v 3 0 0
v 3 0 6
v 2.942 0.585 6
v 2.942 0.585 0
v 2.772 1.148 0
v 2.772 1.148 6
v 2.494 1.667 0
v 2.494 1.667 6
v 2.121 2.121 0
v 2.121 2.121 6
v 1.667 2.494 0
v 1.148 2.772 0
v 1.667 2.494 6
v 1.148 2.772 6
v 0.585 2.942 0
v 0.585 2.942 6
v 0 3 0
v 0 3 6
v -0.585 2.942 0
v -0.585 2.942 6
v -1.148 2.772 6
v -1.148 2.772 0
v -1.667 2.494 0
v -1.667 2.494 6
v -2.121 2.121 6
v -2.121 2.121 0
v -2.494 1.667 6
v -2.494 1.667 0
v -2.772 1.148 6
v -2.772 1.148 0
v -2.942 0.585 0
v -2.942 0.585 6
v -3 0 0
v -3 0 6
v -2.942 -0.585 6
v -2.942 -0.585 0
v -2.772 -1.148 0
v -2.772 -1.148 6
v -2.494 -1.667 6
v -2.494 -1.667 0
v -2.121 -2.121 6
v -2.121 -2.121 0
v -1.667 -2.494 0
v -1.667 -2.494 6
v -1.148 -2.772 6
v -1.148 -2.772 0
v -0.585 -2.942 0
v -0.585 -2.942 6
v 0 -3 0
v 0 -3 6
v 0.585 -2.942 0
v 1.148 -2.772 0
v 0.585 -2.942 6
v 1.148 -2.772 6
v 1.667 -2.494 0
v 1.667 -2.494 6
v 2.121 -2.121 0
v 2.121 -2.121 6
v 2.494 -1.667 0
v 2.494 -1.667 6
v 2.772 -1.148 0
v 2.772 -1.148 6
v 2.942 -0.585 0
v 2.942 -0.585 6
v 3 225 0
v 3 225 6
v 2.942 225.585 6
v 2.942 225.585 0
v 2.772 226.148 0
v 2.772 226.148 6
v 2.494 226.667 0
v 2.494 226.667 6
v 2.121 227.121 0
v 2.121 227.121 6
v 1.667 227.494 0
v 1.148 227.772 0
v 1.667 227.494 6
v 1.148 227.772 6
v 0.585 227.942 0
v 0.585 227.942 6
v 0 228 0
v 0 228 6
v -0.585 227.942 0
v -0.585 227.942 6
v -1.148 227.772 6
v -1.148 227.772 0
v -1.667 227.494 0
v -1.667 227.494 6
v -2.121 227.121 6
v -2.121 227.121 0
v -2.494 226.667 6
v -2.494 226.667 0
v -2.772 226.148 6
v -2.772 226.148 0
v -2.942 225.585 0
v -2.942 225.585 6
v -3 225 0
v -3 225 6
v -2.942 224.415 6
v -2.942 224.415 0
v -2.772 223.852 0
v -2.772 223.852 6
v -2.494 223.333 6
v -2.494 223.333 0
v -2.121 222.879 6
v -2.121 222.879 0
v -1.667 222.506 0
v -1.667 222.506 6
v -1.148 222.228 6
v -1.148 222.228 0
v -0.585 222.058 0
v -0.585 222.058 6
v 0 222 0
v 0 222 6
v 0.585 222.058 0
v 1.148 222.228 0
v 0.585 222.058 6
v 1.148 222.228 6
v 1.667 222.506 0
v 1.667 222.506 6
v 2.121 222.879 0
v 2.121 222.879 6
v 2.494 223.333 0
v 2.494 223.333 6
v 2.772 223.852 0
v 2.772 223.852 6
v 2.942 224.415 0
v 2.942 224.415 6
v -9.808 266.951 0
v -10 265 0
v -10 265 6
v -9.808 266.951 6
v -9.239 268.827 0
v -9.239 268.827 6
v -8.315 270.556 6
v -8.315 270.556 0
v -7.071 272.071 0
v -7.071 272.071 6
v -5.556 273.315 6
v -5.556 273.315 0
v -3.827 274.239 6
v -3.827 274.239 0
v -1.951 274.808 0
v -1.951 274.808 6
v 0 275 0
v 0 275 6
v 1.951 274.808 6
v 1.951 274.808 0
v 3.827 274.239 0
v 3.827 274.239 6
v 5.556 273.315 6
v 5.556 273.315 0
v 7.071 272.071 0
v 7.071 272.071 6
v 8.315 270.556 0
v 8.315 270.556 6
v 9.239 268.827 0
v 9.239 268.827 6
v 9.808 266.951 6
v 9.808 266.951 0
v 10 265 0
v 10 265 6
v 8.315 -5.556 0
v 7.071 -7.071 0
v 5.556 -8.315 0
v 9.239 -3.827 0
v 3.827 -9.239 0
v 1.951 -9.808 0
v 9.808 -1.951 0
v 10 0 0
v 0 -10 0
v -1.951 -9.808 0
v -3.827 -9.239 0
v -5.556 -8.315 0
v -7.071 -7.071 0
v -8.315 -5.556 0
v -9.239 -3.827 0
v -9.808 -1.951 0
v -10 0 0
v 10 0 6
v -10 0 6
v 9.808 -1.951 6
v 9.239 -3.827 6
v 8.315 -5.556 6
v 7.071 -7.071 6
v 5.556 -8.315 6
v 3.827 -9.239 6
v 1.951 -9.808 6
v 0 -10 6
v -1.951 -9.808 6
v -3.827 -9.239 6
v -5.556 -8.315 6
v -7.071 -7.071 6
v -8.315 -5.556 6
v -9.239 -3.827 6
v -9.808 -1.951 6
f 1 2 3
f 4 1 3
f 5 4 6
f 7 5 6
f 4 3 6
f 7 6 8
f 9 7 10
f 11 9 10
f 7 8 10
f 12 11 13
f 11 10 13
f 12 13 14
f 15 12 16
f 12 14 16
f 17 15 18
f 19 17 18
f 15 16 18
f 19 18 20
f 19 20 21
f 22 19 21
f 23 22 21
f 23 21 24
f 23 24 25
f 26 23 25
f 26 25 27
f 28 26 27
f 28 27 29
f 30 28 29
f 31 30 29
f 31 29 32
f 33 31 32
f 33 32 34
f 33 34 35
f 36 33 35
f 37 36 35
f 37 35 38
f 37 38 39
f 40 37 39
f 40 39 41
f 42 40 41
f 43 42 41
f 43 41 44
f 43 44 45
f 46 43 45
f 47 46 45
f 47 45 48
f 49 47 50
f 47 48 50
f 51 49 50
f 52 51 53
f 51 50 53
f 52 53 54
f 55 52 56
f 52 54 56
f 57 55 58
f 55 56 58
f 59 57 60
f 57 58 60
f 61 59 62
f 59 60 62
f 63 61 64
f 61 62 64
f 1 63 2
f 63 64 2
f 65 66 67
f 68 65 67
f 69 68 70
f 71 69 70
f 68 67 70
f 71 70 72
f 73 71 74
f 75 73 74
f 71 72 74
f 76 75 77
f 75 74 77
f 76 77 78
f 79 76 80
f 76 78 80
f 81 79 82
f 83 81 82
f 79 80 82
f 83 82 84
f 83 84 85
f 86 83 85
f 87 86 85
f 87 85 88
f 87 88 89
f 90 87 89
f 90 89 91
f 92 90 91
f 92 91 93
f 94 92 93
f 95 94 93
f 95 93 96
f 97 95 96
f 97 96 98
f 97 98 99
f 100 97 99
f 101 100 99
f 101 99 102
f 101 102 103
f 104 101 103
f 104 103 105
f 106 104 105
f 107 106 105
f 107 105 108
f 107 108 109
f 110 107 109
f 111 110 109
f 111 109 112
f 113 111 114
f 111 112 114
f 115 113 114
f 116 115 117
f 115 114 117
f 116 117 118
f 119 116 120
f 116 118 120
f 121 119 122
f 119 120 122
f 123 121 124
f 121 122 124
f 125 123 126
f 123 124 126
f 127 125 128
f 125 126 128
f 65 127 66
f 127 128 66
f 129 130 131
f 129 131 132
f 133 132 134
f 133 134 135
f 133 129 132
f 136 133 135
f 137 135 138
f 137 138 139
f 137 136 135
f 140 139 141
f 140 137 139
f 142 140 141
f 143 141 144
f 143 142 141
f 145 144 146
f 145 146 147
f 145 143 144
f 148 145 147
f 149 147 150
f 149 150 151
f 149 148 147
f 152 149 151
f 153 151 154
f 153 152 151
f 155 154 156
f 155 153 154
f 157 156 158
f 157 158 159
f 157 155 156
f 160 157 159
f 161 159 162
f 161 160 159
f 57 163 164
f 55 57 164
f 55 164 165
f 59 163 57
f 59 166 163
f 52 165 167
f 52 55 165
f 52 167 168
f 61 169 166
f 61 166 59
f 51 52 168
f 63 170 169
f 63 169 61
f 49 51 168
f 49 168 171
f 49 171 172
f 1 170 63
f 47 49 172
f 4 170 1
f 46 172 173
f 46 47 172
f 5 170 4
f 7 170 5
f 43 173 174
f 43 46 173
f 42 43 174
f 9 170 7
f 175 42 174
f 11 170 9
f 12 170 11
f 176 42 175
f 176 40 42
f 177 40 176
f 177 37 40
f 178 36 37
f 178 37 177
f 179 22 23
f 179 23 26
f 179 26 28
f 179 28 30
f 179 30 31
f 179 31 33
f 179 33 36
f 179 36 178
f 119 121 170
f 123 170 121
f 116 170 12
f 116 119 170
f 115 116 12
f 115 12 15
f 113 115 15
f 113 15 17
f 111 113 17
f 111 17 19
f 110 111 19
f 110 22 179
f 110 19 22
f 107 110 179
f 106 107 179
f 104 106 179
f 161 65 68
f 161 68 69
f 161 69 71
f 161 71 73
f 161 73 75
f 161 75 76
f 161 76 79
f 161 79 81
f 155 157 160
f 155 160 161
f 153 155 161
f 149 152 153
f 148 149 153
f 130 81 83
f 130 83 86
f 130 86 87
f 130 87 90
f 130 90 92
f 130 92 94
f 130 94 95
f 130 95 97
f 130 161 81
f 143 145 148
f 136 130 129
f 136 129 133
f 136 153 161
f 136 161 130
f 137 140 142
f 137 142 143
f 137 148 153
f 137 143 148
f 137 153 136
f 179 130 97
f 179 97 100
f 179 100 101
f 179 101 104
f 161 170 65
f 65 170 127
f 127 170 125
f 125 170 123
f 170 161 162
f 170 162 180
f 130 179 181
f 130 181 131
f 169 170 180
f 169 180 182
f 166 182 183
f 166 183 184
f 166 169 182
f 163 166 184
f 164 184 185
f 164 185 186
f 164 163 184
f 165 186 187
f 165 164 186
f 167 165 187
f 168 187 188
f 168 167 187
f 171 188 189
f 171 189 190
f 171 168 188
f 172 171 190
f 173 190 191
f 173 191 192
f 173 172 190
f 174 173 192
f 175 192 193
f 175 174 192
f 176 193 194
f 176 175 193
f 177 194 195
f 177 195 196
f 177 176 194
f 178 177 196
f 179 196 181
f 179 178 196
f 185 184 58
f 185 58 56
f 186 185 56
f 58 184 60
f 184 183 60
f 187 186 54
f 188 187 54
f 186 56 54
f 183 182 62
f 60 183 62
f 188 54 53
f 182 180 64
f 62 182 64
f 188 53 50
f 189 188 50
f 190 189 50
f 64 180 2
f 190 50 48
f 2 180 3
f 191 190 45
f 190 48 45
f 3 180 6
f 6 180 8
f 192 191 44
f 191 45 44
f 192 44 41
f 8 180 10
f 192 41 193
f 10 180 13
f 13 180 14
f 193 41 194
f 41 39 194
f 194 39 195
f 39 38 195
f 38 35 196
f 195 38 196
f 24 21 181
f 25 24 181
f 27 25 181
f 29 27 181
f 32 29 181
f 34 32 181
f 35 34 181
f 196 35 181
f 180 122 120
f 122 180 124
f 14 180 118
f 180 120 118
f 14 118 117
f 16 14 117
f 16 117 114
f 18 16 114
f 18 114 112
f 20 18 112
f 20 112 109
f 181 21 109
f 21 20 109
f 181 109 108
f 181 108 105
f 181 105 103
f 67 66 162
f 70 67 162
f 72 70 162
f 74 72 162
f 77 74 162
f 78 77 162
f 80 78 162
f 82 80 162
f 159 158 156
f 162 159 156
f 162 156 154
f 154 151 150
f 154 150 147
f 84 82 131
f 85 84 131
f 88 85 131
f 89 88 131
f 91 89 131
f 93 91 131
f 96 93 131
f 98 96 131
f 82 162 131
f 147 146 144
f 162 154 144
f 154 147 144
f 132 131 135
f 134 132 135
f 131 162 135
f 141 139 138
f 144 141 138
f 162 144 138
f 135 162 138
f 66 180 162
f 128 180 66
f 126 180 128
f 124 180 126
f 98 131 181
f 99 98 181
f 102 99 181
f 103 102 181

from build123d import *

# Parameters (mm, degrees)
BOSS_EXTRUDE1_DEPTH = 6
SKETCH2_R           = 3
CUT_EXTRUDE1_DEPTH  = 236.289183772
BOSS_EXTRUDE2_START = -6
BOSS_EXTRUDE2_DEPTH = 6


with BuildPart() as part:
    # Sketch1 → Boss-Extrude1 (new body)
    with BuildSketch(Plane.XY):
        with BuildLine():
            Line((-10, 0), (-10, 225))
            ThreePointArc((-10, 225), (0, 235), (10, 225))
            Line((10, 225), (10, 0))
            ThreePointArc((10, 0), (0, -10), (-10, 0))
        make_face()
    extrude(amount=BOSS_EXTRUDE1_DEPTH)

    # Sketch2 → Cut-Extrude1 (cut, through all)
    with BuildSketch(Plane.XY.offset(6)):
        with Locations((0, 225)):
            Circle(SKETCH2_R)
        Circle(SKETCH2_R)
    extrude(amount=-CUT_EXTRUDE1_DEPTH, mode=Mode.SUBTRACT)

    # Sketch3 → Boss-Extrude2 (add)
    with BuildSketch(Plane.XY.offset(6).offset(BOSS_EXTRUDE2_START)):
        with BuildLine():
            Line((-10, 225), (-10, 265))
            ThreePointArc((-10, 265), (0, 275), (10, 265))
            Line((10, 265), (10, 225))
            ThreePointArc((10, 225), (0, 235), (-10, 225))
        make_face()
    extrude(amount=BOSS_EXTRUDE2_DEPTH)


solid = part.part
